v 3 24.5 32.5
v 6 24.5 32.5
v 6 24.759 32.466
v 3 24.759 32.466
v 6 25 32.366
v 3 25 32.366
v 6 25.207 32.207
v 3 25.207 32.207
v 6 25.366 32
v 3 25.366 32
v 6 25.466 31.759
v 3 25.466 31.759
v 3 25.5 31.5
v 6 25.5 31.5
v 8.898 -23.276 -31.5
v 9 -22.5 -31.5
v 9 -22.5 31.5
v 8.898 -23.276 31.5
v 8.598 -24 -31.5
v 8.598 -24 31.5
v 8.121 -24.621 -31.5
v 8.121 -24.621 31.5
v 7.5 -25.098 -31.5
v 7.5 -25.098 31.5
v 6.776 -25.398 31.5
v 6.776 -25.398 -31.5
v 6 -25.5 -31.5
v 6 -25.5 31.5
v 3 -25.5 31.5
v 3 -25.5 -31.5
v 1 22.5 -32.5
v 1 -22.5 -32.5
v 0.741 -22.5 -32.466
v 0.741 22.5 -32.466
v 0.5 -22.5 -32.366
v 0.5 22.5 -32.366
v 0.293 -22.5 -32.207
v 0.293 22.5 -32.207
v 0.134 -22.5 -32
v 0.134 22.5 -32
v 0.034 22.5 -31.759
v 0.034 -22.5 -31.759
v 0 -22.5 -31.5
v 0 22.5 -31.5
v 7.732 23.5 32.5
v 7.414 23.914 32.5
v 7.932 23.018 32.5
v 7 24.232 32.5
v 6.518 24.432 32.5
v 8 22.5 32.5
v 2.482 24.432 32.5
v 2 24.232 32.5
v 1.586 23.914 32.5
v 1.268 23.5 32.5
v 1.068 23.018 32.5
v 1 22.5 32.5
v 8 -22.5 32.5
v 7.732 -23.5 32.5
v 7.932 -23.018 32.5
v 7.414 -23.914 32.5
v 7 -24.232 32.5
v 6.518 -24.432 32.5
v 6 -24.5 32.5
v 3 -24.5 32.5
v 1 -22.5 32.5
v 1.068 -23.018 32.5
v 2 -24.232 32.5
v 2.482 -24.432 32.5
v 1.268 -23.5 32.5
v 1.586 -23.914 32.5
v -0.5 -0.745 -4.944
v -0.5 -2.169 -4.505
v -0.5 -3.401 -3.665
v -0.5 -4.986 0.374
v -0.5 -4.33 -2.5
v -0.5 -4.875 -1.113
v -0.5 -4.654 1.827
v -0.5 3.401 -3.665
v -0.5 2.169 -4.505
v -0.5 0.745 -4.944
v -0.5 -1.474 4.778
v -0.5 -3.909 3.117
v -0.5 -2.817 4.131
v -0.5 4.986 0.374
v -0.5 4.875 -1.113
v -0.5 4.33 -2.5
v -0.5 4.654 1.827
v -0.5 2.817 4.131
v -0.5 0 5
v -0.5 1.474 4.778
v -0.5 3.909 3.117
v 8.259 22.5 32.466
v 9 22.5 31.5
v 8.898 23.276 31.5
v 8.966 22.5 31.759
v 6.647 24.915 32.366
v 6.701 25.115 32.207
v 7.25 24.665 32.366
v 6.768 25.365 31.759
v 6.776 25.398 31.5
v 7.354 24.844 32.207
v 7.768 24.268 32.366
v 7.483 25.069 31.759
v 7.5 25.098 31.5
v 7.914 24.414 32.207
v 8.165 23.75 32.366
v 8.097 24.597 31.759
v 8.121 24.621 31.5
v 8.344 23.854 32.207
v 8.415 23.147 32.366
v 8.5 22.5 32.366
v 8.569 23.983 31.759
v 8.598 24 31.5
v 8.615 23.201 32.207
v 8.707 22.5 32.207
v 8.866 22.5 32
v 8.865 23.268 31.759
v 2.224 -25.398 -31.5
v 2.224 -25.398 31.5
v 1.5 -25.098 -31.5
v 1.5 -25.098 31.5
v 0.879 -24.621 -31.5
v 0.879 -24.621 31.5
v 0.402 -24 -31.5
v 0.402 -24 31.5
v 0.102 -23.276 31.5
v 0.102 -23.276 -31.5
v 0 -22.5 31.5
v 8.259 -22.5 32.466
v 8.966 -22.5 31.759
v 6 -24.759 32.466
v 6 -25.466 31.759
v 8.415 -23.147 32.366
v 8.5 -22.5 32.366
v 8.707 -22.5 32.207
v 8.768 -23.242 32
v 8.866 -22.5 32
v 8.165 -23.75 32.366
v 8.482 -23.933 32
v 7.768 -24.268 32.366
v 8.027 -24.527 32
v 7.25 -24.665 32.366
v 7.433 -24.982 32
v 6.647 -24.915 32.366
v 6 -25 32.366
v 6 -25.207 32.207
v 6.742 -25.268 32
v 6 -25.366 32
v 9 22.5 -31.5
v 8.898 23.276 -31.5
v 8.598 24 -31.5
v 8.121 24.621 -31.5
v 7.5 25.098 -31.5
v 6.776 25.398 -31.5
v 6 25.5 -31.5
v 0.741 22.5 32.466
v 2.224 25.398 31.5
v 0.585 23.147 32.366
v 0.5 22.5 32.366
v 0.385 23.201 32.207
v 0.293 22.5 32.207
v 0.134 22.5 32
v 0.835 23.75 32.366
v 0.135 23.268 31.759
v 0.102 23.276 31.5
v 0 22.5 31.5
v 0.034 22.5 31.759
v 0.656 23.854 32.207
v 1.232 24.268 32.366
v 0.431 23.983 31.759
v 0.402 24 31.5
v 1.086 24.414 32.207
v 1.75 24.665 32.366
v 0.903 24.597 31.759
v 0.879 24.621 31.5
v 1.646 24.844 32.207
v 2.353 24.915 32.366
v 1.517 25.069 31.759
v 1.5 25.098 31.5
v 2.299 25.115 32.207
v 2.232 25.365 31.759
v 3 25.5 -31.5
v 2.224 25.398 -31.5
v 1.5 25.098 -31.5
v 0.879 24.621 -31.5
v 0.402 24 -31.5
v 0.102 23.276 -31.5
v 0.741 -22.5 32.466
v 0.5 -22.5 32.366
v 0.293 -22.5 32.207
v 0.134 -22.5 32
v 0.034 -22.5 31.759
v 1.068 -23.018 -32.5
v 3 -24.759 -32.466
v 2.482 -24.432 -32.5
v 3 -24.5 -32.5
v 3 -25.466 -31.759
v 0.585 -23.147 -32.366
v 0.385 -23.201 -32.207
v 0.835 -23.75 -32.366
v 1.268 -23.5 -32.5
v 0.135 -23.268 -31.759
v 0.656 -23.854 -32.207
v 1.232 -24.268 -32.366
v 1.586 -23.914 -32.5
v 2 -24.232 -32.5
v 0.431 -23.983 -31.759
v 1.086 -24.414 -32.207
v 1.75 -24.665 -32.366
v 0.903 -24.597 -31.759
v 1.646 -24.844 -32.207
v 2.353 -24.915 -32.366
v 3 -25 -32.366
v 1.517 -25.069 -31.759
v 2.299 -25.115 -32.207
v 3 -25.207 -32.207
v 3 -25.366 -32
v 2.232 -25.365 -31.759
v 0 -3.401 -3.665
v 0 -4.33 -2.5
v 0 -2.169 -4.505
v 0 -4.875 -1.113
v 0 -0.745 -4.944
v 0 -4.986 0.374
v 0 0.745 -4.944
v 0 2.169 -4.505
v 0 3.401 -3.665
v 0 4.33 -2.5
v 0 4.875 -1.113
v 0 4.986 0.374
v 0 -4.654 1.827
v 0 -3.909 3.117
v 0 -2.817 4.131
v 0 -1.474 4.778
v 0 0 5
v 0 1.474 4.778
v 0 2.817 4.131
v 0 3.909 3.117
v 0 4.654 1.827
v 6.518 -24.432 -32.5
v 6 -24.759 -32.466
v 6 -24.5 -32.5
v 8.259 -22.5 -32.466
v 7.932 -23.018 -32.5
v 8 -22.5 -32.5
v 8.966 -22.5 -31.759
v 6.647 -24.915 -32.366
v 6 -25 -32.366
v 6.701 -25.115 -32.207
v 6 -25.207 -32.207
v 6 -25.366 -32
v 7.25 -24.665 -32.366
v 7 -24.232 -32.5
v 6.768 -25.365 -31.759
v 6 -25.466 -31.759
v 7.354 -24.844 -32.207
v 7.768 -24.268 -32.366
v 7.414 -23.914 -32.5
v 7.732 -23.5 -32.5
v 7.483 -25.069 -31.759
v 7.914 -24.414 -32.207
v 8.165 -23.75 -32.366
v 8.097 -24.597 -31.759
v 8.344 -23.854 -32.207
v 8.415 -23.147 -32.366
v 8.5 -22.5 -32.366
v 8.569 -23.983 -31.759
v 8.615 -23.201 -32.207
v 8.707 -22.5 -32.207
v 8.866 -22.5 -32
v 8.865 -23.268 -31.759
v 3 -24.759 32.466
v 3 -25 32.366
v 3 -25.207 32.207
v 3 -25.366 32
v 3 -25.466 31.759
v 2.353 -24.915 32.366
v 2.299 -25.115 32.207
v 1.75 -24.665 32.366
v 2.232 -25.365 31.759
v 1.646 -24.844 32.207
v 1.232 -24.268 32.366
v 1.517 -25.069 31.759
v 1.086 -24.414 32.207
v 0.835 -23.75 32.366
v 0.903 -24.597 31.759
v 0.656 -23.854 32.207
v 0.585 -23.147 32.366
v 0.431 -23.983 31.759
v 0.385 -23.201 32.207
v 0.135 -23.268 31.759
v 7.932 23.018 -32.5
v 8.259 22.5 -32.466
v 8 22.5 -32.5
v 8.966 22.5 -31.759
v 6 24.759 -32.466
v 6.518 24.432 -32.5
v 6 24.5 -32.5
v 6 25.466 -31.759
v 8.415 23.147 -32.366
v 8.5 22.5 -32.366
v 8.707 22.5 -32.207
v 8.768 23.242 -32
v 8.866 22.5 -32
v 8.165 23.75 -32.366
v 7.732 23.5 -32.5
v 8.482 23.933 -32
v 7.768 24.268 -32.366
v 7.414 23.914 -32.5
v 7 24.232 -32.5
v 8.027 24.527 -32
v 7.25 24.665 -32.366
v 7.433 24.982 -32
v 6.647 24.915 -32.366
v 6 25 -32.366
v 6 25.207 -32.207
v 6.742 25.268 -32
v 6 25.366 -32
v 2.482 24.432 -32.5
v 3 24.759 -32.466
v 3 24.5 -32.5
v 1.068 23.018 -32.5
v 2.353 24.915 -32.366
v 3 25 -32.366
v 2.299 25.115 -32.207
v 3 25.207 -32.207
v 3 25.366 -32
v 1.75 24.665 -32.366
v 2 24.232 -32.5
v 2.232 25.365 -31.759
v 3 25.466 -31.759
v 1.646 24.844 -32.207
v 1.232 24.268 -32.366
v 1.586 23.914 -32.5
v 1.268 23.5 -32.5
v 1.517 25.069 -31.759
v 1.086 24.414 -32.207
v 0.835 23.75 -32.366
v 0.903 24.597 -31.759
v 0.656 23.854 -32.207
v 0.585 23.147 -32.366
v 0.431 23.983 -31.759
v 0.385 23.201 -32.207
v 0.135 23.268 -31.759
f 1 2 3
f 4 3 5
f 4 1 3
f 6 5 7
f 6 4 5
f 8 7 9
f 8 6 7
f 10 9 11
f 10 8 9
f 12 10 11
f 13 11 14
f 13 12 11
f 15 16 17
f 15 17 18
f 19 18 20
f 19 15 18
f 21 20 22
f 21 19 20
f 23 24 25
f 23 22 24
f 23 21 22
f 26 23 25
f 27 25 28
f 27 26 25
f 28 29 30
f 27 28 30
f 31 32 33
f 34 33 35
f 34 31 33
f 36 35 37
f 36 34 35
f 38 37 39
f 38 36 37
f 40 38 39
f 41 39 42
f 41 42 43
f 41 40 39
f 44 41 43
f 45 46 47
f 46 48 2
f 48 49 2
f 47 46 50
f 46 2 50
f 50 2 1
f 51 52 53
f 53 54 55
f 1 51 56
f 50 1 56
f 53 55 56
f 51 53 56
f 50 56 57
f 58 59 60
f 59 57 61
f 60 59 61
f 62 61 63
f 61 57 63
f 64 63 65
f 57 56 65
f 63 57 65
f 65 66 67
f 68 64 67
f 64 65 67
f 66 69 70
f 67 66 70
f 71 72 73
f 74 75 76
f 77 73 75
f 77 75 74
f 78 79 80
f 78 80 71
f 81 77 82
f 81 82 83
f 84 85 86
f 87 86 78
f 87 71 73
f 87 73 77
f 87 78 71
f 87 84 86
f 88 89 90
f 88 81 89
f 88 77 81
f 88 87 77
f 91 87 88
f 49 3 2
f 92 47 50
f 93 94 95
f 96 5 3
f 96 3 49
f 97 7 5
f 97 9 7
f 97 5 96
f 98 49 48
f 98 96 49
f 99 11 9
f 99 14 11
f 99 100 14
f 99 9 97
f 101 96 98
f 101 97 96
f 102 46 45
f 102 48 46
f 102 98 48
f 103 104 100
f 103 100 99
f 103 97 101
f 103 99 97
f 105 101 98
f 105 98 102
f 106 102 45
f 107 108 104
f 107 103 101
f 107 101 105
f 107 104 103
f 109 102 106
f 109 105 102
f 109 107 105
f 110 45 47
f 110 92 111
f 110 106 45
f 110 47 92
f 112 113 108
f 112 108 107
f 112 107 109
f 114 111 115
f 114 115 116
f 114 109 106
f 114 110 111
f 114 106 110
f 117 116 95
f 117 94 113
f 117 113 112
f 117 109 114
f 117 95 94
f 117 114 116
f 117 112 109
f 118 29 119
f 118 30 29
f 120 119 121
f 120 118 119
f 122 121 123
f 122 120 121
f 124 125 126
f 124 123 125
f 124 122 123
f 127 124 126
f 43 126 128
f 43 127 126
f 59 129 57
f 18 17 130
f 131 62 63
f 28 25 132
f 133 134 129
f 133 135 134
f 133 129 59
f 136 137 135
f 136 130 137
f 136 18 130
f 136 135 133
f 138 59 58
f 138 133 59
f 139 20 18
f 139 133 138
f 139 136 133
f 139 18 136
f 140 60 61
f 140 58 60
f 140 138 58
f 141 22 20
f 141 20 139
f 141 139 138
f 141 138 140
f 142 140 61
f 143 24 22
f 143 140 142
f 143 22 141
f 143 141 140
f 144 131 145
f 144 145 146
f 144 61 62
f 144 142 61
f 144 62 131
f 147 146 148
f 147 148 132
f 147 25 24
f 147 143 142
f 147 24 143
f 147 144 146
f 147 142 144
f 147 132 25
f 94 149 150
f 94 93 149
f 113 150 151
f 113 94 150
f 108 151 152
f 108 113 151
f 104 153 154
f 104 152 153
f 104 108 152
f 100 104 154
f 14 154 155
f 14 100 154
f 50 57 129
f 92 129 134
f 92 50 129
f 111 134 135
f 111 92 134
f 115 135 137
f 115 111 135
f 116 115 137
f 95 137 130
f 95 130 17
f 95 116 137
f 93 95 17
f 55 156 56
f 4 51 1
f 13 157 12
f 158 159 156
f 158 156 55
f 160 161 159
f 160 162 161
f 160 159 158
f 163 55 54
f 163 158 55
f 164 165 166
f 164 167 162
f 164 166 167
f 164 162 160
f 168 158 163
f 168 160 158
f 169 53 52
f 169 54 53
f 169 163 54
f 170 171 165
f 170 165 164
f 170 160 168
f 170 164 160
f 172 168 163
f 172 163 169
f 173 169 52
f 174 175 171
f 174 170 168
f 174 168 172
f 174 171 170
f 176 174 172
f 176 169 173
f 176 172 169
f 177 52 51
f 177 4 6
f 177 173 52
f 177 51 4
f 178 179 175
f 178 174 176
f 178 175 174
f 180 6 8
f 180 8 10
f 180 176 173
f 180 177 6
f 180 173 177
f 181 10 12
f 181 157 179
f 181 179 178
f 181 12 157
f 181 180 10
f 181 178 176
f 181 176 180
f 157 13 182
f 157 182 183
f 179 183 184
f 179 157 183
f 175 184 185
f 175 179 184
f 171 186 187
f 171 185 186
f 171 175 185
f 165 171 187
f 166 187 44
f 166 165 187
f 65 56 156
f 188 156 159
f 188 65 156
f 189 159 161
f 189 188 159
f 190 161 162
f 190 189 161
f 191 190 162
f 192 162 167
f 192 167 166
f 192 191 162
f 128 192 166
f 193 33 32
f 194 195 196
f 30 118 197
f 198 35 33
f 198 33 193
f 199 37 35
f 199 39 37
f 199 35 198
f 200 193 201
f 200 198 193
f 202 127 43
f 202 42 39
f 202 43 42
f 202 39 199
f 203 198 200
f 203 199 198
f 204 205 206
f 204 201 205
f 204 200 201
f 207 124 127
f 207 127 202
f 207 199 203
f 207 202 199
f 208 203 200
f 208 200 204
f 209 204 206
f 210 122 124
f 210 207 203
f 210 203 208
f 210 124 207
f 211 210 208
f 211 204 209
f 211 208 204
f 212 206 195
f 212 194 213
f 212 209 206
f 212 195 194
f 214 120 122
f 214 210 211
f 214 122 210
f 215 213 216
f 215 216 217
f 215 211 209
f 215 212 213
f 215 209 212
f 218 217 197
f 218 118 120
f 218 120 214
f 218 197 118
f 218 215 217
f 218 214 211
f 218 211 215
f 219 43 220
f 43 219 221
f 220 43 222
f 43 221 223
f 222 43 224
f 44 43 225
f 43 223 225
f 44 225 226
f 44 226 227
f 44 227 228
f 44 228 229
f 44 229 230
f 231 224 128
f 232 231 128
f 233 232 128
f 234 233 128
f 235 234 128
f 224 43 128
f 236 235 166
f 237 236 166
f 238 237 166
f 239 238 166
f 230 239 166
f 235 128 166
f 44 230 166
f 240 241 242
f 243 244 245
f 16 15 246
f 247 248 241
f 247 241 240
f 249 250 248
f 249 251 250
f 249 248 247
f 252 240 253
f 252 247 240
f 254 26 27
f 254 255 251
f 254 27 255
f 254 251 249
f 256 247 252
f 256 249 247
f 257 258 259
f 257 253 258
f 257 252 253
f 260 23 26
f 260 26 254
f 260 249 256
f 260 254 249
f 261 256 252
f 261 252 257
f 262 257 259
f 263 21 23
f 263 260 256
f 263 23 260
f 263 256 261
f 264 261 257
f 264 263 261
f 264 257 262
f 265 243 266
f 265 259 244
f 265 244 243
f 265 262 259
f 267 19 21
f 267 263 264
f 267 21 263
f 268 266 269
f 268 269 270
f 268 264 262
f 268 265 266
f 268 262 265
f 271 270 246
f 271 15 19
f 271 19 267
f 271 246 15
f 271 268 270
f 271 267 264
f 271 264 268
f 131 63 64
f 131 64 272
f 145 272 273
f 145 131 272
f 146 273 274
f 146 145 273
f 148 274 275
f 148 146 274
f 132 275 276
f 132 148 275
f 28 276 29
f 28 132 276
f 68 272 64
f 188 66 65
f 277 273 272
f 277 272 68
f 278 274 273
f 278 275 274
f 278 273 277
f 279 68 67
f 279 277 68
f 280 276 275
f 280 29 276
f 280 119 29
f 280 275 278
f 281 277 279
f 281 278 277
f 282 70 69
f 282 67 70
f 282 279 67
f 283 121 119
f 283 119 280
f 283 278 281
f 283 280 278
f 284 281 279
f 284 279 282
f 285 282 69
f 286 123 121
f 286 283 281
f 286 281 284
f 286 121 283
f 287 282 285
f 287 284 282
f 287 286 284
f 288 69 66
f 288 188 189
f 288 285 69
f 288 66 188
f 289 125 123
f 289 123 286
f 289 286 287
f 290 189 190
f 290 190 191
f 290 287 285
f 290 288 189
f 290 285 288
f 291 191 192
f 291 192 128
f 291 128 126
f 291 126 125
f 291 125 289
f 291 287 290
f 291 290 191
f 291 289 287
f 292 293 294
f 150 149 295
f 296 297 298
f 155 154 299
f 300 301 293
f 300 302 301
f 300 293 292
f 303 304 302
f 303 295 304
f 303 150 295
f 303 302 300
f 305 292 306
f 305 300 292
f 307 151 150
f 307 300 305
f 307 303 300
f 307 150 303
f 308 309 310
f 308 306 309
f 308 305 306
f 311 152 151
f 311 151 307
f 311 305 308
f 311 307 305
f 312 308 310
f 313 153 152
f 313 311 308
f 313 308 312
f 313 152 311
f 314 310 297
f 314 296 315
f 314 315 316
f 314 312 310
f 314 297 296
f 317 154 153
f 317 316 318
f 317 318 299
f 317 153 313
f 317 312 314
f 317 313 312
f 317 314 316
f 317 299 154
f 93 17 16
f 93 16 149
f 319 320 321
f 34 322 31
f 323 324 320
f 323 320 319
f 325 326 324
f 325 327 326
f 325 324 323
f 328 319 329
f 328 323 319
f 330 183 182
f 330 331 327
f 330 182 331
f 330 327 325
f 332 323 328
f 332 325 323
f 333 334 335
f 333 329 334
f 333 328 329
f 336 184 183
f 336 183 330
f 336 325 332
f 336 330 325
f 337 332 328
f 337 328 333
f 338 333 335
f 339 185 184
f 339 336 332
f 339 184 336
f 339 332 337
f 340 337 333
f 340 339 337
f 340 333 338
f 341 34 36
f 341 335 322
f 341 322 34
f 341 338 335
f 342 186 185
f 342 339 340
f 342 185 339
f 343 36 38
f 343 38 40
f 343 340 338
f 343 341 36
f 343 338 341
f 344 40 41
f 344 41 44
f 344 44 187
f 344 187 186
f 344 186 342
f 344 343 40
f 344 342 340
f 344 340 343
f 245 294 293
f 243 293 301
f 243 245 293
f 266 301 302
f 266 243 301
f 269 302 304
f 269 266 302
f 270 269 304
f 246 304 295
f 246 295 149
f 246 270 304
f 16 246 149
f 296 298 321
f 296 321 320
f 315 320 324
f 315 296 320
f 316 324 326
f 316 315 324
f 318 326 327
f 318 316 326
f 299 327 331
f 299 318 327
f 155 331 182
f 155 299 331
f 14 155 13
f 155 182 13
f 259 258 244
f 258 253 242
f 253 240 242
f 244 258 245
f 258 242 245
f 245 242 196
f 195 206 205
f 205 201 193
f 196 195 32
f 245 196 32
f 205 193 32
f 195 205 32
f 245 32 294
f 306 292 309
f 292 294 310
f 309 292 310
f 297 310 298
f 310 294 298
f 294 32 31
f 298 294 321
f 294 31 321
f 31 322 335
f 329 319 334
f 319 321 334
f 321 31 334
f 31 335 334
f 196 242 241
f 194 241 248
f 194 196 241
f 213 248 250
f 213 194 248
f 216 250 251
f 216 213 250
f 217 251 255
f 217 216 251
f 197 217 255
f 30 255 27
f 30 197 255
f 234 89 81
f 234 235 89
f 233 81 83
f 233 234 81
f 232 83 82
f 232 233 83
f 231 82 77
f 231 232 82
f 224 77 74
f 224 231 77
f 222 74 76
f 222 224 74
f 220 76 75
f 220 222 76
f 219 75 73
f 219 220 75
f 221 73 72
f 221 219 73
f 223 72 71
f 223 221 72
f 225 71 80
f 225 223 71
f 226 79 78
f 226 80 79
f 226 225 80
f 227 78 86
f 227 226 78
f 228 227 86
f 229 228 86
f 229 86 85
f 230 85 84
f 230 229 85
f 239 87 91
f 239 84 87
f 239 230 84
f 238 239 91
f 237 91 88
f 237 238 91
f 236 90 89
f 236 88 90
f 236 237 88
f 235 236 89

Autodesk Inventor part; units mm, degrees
ref_plane "YZ Plane" through (0, 0, 0) normal (1, 0, 0) x (0, 1, 0)
ref_plane "XZ Plane" through (0, 0, 0) normal (0, 1, 0) x (-1, 0, 0)
ref_plane "XY Plane" through (0, 0, 0) normal (0, 0, 1) x (1, 0, 0)
sketch "Skizze1" plane through (0, 0, 0) normal (1, 0, 0) x (0, 1, 0)
  line L0 (-25.5, -32.5) -> (25.5, -32.5)
  line L1 (25.5, -32.5) -> (25.5, 32.5)
  line L2 (25.5, 32.5) -> (-25.5, 32.5)
  line L3 (-25.5, 32.5) -> (-25.5, -32.5)
  line L4 (-25.5, -32.5) -> (25.5, 32.5) construction
  line L5 (25.5, -32.5) -> (-25.5, 32.5) construction
  point P0 (0, 0)
  dimension "d0" = 51
  dimension "d1" = 65
extrude "Extrusion1" add sketch "Skizze1" along normal blind 9
fillet "Rundung1" radius 3 4 edges at (9, 25.5, 0) (0, 25.5, 0) (9, -25.5, 0) (0, -25.5, 0)
fillet "Rundung2" radius 1 16 edges at (8.1213, -24.6213, 32.5) (4.5, -25.5, 32.5) (0.8787, -24.6213, 32.5) (0, 0, 32.5) (0.8787, 24.6213, 32.5) (4.5, 25.5, 32.5) (8.1213, 24.6213, 32.5) (9, 0, 32.5) (8.1213, 24.6213, -32.5) (4.5, 25.5, -32.5) (0.8787, 24.6213, -32.5) (0, 0, -32.5) (0.8787, -24.6213, -32.5) (4.5, -25.5, -32.5) (8.1213, -24.6213, -32.5) (9, 0, -32.5)
sketch "Skizze2" plane through (0, 0, 0) normal (-1, 0, 0) x (0, 0, 1)
  circle A0 centre (0, 0) radius 5
  dimension "d6" = 10
extrude "Extrusion2" add sketch "Skizze2" along normal blind 0.5
properties part number "PKCell 3.7V 2500mAh"
